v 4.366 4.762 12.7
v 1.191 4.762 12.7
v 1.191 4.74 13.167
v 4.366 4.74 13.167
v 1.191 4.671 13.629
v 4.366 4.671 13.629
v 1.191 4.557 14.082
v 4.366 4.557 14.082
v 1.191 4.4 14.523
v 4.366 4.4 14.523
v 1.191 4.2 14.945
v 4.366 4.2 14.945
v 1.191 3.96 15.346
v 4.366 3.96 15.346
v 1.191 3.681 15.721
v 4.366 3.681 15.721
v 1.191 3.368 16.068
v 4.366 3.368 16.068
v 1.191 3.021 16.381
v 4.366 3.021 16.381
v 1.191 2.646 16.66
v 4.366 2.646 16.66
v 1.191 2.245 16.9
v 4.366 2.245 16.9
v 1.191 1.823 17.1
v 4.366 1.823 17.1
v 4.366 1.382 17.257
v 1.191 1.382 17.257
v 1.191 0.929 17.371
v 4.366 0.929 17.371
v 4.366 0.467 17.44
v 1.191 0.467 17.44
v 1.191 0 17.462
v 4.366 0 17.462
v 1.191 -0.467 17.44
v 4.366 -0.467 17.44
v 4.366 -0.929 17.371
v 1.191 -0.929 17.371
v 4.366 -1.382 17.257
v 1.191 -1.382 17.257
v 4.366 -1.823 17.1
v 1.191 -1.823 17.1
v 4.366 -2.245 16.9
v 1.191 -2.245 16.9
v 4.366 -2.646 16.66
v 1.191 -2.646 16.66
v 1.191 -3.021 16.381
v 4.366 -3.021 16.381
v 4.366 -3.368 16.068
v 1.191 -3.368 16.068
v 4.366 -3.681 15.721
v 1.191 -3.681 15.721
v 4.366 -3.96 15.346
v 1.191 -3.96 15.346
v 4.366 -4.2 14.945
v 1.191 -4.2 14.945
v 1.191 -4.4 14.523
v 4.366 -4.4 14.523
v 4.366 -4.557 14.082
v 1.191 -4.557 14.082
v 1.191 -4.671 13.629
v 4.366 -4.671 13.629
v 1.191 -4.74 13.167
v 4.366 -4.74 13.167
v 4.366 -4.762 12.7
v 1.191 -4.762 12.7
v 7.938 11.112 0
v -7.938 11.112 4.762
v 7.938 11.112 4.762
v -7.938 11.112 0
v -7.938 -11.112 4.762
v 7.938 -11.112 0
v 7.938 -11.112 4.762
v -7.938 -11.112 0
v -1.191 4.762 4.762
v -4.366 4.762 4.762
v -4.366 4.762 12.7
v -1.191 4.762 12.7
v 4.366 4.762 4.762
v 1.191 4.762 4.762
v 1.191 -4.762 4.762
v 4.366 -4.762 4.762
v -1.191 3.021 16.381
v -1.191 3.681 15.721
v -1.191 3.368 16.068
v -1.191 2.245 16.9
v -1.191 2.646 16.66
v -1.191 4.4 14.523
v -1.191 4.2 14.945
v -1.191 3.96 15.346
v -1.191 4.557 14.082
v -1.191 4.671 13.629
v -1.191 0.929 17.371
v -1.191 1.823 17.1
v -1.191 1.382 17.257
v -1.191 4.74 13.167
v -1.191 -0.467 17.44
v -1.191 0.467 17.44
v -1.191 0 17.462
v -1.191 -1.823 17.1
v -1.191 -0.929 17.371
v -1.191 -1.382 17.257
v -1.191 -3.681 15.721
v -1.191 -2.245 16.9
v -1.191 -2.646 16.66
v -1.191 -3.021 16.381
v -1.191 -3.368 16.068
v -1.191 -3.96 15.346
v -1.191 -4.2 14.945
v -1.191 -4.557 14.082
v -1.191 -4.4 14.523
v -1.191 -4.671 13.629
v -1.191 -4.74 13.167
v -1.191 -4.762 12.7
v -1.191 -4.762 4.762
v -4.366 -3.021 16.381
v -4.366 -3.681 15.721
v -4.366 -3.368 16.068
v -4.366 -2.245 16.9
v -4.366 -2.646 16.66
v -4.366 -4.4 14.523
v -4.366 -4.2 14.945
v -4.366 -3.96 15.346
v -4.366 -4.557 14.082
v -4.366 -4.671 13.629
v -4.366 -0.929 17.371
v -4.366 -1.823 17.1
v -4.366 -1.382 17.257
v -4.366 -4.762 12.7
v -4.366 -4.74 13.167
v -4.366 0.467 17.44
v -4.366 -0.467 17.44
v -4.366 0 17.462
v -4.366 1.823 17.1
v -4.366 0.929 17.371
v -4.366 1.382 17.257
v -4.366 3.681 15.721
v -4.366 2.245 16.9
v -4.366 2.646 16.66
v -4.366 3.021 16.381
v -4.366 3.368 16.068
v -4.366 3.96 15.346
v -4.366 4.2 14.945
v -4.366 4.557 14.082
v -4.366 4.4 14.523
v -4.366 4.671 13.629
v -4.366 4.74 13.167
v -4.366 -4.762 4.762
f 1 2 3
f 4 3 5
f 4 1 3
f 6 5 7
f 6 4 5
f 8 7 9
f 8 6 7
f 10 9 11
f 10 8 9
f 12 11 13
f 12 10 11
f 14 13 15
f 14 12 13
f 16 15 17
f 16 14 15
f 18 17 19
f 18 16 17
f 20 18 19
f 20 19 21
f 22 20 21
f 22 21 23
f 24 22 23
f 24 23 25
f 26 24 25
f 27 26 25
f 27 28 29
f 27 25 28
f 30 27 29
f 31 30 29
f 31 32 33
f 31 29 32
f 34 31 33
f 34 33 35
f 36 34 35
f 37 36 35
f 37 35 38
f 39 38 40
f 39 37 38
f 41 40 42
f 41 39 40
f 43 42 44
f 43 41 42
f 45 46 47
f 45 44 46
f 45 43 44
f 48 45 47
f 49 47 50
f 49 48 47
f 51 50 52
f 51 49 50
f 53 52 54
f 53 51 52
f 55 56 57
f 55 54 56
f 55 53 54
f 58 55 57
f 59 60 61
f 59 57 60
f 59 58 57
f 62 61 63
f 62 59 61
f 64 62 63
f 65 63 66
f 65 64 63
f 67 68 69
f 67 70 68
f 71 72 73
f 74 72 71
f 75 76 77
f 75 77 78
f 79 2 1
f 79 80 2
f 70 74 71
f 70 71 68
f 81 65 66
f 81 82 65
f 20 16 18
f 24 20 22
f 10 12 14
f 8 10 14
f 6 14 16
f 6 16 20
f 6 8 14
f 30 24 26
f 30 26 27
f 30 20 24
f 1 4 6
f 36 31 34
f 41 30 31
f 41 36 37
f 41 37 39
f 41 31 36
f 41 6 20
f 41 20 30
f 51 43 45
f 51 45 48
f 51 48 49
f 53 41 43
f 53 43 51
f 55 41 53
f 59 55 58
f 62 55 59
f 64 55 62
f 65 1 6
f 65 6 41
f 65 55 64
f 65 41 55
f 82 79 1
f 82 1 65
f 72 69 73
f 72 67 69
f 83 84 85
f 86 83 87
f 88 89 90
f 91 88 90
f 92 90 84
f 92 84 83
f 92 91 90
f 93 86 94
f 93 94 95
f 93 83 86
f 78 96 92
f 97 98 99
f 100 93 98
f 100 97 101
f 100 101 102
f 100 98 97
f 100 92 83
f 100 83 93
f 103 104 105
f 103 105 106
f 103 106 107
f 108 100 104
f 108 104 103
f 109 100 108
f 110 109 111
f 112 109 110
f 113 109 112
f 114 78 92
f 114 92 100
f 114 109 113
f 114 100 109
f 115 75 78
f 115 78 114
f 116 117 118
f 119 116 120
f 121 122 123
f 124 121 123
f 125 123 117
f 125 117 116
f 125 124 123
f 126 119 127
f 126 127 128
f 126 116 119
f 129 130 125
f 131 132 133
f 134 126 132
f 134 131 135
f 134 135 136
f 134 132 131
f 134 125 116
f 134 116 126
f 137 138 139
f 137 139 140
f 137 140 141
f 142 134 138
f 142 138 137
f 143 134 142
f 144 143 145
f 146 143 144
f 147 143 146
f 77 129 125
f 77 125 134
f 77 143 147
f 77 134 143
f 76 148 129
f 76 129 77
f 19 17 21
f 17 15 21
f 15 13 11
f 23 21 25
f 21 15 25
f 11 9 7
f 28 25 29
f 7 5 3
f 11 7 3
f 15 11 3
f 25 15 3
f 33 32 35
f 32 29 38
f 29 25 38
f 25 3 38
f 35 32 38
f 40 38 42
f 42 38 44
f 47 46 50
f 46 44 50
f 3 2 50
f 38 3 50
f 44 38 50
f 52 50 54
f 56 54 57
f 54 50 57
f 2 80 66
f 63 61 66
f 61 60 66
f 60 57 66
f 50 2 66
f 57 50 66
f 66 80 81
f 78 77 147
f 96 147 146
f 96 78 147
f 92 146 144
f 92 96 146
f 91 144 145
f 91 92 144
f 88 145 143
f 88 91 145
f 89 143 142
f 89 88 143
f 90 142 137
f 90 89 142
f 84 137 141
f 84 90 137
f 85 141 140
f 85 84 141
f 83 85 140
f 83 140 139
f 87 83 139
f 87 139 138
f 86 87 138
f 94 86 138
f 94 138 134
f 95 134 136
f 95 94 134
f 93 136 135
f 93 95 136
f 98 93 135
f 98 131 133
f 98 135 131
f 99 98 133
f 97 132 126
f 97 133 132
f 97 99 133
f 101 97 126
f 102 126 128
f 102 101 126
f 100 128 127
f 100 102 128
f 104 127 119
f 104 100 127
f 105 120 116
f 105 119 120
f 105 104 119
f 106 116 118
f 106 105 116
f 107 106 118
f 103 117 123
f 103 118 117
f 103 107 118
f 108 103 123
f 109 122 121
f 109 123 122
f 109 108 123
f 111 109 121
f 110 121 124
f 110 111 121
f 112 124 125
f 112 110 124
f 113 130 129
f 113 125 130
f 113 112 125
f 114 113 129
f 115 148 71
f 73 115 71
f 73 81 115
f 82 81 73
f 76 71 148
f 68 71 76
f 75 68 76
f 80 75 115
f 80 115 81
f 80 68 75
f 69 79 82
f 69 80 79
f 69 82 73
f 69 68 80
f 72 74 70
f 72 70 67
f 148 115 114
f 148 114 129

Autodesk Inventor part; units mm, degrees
ref_plane "YZ Plane" through (0, 0, 0) normal (1, 0, 0) x (0, 1, 0)
ref_plane "XZ Plane" through (0, 0, 0) normal (0, 1, 0) x (-1, 0, 0)
ref_plane "XY Plane" through (0, 0, 0) normal (0, 0, 1) x (1, 0, 0)
sketch "Sketch1" plane through (0, 0, 0) normal (0, 0, 1) x (1, 0, 0)
  line L0 (-11.1125, 0) -> (11.1125, 0) projected
  line L1 (0, -15.5575) -> (0, 15.5575) projected
  line L2 (-7.9375, 11.1125) -> (7.9375, 11.1125)
  line L3 (7.9375, 11.1125) -> (7.9375, -11.1125)
  line L4 (7.9375, -11.1125) -> (-7.9375, -11.1125)
  line L5 (-7.9375, -11.1125) -> (-7.9375, 11.1125)
  point P0 (0, 0)
  point P1 (-7.9375, 0)
  point P2 (0, 11.1125)
  dimension "d0" = 15.875
  dimension "d1" = 22.225
extrude "Extrusion1" add sketch "Sketch1" along normal blind 4.7625
sketch "Sketch2" plane through (0, 0, 4.7625) normal (0, 0, 1) x (1, 0, 0)
  line L0 (4.3656, 4.7625) -> (4.3656, -4.7625)
  line L1 (-4.3656, -4.7625) -> (-4.3656, 4.7625)
  line L2 (-1.1906, 4.7625) -> (-1.1906, -4.7625)
  line L3 (1.1906, 4.7625) -> (1.1906, -4.7625)
  line L4 (-4.3656, 4.7625) -> (-1.1906, 4.7625)
  line L5 (1.1906, 4.7625) -> (4.3656, 4.7625)
  line L6 (4.3656, -4.7625) -> (1.1906, -4.7625)
  line L7 (-1.1906, -4.7625) -> (-4.3656, -4.7625)
  line L8 (1.1906, 4.7625) -> (-1.1906, 4.7625) construction
  line L9 (-1.1906, -4.7625) -> (1.1906, -4.7625) construction
  point P0 (0, 0)
  point P1 (-4.3656, 0)
  point P2 (0, 6.35)
  point P3 (0, 4.7625)
  dimension "d5" = 9.525
  dimension "d10" = 2.3813
  dimension "d11" = 3.175
extrude "Extrusion4" add sketch "Sketch2" along normal blind 12.7
sketch "Sketch4" plane through (4.3656, -4.7625, 4.7625) normal (1, 0, 0) x (0, 0, -1)
  line L0 (-12.7, 9.525) -> (-12.7, 0) projected
  line L1 (0, 0) -> (-12.7, 0) projected
  line L2 (0, 9.525) -> (0, 0) projected
  line L3 (0, 9.525) -> (-12.7, 9.525) projected
  arc A0 (-7.9375, 9.525) -> (-7.9375, 0) centre (-7.9375, 4.7625) ccw
  point P0 (4.7625, 4.7625)
extrude "Extrusion5" cut sketch "Sketch4" against normal through all contours L3 A0 L0 | A0 L1 L0
properties part number "piston mount bracket"
